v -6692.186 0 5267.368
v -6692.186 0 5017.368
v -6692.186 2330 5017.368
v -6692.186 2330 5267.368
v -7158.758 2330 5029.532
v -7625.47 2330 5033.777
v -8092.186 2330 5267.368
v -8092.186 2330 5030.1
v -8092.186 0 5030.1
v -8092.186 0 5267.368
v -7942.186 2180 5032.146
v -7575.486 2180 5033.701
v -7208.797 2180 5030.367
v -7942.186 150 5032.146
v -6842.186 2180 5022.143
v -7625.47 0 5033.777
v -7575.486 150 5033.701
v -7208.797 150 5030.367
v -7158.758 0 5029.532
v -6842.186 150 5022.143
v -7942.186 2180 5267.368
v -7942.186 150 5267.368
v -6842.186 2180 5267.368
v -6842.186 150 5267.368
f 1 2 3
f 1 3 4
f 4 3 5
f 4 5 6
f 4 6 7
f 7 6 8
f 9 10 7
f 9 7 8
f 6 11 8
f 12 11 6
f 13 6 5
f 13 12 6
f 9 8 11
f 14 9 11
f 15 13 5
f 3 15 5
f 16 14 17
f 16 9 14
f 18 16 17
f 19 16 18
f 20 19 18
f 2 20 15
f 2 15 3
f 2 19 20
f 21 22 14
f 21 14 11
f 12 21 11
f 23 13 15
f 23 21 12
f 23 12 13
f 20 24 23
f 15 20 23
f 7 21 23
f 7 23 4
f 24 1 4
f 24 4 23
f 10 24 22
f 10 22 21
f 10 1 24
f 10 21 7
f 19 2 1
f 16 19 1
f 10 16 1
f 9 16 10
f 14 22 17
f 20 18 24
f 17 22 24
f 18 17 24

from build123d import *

# Parameters (mm, degrees)
BOSS_EXTRUDE1_DEPTH = 2330
SKETCH3_W           = 1100
SKETCH3_H           = 2030
CUT_EXTRUDE1_DEPTH  = 3000


with BuildPart() as part:
    # Sketch2 → Boss-Extrude1 (new body)
    with BuildSketch(Plane(origin=(0, 0, 0), x_dir=(1, 0, 0), z_dir=(0, 1, 0))):
        with BuildLine():
            Line((-6692.186143144, -5017.367964626), (-6692.186143144, -5267.367964626))
            Line((-6692.186143144, -5267.367964626), (-8092.186143144, -5267.367964626))
            Line((-8092.186143144, -5267.367964626), (-8092.186143144, -5030.09988938))
            ThreePointArc((-8092.186143144, -5030.09988938), (-7392.105105324, -5032.64483009), (-6692.186143144, -5017.367964626))
        make_face()
    extrude(amount=BOSS_EXTRUDE1_DEPTH)

    # Sketch3 → Cut-Extrude1 (cut)
    with BuildSketch(Plane.XY.offset(5267.367964626)):
        with Locations((-7392.186143144, 1165)):
            Rectangle(SKETCH3_W, SKETCH3_H)
    extrude(amount=-CUT_EXTRUDE1_DEPTH, mode=Mode.SUBTRACT)


solid = part.part
